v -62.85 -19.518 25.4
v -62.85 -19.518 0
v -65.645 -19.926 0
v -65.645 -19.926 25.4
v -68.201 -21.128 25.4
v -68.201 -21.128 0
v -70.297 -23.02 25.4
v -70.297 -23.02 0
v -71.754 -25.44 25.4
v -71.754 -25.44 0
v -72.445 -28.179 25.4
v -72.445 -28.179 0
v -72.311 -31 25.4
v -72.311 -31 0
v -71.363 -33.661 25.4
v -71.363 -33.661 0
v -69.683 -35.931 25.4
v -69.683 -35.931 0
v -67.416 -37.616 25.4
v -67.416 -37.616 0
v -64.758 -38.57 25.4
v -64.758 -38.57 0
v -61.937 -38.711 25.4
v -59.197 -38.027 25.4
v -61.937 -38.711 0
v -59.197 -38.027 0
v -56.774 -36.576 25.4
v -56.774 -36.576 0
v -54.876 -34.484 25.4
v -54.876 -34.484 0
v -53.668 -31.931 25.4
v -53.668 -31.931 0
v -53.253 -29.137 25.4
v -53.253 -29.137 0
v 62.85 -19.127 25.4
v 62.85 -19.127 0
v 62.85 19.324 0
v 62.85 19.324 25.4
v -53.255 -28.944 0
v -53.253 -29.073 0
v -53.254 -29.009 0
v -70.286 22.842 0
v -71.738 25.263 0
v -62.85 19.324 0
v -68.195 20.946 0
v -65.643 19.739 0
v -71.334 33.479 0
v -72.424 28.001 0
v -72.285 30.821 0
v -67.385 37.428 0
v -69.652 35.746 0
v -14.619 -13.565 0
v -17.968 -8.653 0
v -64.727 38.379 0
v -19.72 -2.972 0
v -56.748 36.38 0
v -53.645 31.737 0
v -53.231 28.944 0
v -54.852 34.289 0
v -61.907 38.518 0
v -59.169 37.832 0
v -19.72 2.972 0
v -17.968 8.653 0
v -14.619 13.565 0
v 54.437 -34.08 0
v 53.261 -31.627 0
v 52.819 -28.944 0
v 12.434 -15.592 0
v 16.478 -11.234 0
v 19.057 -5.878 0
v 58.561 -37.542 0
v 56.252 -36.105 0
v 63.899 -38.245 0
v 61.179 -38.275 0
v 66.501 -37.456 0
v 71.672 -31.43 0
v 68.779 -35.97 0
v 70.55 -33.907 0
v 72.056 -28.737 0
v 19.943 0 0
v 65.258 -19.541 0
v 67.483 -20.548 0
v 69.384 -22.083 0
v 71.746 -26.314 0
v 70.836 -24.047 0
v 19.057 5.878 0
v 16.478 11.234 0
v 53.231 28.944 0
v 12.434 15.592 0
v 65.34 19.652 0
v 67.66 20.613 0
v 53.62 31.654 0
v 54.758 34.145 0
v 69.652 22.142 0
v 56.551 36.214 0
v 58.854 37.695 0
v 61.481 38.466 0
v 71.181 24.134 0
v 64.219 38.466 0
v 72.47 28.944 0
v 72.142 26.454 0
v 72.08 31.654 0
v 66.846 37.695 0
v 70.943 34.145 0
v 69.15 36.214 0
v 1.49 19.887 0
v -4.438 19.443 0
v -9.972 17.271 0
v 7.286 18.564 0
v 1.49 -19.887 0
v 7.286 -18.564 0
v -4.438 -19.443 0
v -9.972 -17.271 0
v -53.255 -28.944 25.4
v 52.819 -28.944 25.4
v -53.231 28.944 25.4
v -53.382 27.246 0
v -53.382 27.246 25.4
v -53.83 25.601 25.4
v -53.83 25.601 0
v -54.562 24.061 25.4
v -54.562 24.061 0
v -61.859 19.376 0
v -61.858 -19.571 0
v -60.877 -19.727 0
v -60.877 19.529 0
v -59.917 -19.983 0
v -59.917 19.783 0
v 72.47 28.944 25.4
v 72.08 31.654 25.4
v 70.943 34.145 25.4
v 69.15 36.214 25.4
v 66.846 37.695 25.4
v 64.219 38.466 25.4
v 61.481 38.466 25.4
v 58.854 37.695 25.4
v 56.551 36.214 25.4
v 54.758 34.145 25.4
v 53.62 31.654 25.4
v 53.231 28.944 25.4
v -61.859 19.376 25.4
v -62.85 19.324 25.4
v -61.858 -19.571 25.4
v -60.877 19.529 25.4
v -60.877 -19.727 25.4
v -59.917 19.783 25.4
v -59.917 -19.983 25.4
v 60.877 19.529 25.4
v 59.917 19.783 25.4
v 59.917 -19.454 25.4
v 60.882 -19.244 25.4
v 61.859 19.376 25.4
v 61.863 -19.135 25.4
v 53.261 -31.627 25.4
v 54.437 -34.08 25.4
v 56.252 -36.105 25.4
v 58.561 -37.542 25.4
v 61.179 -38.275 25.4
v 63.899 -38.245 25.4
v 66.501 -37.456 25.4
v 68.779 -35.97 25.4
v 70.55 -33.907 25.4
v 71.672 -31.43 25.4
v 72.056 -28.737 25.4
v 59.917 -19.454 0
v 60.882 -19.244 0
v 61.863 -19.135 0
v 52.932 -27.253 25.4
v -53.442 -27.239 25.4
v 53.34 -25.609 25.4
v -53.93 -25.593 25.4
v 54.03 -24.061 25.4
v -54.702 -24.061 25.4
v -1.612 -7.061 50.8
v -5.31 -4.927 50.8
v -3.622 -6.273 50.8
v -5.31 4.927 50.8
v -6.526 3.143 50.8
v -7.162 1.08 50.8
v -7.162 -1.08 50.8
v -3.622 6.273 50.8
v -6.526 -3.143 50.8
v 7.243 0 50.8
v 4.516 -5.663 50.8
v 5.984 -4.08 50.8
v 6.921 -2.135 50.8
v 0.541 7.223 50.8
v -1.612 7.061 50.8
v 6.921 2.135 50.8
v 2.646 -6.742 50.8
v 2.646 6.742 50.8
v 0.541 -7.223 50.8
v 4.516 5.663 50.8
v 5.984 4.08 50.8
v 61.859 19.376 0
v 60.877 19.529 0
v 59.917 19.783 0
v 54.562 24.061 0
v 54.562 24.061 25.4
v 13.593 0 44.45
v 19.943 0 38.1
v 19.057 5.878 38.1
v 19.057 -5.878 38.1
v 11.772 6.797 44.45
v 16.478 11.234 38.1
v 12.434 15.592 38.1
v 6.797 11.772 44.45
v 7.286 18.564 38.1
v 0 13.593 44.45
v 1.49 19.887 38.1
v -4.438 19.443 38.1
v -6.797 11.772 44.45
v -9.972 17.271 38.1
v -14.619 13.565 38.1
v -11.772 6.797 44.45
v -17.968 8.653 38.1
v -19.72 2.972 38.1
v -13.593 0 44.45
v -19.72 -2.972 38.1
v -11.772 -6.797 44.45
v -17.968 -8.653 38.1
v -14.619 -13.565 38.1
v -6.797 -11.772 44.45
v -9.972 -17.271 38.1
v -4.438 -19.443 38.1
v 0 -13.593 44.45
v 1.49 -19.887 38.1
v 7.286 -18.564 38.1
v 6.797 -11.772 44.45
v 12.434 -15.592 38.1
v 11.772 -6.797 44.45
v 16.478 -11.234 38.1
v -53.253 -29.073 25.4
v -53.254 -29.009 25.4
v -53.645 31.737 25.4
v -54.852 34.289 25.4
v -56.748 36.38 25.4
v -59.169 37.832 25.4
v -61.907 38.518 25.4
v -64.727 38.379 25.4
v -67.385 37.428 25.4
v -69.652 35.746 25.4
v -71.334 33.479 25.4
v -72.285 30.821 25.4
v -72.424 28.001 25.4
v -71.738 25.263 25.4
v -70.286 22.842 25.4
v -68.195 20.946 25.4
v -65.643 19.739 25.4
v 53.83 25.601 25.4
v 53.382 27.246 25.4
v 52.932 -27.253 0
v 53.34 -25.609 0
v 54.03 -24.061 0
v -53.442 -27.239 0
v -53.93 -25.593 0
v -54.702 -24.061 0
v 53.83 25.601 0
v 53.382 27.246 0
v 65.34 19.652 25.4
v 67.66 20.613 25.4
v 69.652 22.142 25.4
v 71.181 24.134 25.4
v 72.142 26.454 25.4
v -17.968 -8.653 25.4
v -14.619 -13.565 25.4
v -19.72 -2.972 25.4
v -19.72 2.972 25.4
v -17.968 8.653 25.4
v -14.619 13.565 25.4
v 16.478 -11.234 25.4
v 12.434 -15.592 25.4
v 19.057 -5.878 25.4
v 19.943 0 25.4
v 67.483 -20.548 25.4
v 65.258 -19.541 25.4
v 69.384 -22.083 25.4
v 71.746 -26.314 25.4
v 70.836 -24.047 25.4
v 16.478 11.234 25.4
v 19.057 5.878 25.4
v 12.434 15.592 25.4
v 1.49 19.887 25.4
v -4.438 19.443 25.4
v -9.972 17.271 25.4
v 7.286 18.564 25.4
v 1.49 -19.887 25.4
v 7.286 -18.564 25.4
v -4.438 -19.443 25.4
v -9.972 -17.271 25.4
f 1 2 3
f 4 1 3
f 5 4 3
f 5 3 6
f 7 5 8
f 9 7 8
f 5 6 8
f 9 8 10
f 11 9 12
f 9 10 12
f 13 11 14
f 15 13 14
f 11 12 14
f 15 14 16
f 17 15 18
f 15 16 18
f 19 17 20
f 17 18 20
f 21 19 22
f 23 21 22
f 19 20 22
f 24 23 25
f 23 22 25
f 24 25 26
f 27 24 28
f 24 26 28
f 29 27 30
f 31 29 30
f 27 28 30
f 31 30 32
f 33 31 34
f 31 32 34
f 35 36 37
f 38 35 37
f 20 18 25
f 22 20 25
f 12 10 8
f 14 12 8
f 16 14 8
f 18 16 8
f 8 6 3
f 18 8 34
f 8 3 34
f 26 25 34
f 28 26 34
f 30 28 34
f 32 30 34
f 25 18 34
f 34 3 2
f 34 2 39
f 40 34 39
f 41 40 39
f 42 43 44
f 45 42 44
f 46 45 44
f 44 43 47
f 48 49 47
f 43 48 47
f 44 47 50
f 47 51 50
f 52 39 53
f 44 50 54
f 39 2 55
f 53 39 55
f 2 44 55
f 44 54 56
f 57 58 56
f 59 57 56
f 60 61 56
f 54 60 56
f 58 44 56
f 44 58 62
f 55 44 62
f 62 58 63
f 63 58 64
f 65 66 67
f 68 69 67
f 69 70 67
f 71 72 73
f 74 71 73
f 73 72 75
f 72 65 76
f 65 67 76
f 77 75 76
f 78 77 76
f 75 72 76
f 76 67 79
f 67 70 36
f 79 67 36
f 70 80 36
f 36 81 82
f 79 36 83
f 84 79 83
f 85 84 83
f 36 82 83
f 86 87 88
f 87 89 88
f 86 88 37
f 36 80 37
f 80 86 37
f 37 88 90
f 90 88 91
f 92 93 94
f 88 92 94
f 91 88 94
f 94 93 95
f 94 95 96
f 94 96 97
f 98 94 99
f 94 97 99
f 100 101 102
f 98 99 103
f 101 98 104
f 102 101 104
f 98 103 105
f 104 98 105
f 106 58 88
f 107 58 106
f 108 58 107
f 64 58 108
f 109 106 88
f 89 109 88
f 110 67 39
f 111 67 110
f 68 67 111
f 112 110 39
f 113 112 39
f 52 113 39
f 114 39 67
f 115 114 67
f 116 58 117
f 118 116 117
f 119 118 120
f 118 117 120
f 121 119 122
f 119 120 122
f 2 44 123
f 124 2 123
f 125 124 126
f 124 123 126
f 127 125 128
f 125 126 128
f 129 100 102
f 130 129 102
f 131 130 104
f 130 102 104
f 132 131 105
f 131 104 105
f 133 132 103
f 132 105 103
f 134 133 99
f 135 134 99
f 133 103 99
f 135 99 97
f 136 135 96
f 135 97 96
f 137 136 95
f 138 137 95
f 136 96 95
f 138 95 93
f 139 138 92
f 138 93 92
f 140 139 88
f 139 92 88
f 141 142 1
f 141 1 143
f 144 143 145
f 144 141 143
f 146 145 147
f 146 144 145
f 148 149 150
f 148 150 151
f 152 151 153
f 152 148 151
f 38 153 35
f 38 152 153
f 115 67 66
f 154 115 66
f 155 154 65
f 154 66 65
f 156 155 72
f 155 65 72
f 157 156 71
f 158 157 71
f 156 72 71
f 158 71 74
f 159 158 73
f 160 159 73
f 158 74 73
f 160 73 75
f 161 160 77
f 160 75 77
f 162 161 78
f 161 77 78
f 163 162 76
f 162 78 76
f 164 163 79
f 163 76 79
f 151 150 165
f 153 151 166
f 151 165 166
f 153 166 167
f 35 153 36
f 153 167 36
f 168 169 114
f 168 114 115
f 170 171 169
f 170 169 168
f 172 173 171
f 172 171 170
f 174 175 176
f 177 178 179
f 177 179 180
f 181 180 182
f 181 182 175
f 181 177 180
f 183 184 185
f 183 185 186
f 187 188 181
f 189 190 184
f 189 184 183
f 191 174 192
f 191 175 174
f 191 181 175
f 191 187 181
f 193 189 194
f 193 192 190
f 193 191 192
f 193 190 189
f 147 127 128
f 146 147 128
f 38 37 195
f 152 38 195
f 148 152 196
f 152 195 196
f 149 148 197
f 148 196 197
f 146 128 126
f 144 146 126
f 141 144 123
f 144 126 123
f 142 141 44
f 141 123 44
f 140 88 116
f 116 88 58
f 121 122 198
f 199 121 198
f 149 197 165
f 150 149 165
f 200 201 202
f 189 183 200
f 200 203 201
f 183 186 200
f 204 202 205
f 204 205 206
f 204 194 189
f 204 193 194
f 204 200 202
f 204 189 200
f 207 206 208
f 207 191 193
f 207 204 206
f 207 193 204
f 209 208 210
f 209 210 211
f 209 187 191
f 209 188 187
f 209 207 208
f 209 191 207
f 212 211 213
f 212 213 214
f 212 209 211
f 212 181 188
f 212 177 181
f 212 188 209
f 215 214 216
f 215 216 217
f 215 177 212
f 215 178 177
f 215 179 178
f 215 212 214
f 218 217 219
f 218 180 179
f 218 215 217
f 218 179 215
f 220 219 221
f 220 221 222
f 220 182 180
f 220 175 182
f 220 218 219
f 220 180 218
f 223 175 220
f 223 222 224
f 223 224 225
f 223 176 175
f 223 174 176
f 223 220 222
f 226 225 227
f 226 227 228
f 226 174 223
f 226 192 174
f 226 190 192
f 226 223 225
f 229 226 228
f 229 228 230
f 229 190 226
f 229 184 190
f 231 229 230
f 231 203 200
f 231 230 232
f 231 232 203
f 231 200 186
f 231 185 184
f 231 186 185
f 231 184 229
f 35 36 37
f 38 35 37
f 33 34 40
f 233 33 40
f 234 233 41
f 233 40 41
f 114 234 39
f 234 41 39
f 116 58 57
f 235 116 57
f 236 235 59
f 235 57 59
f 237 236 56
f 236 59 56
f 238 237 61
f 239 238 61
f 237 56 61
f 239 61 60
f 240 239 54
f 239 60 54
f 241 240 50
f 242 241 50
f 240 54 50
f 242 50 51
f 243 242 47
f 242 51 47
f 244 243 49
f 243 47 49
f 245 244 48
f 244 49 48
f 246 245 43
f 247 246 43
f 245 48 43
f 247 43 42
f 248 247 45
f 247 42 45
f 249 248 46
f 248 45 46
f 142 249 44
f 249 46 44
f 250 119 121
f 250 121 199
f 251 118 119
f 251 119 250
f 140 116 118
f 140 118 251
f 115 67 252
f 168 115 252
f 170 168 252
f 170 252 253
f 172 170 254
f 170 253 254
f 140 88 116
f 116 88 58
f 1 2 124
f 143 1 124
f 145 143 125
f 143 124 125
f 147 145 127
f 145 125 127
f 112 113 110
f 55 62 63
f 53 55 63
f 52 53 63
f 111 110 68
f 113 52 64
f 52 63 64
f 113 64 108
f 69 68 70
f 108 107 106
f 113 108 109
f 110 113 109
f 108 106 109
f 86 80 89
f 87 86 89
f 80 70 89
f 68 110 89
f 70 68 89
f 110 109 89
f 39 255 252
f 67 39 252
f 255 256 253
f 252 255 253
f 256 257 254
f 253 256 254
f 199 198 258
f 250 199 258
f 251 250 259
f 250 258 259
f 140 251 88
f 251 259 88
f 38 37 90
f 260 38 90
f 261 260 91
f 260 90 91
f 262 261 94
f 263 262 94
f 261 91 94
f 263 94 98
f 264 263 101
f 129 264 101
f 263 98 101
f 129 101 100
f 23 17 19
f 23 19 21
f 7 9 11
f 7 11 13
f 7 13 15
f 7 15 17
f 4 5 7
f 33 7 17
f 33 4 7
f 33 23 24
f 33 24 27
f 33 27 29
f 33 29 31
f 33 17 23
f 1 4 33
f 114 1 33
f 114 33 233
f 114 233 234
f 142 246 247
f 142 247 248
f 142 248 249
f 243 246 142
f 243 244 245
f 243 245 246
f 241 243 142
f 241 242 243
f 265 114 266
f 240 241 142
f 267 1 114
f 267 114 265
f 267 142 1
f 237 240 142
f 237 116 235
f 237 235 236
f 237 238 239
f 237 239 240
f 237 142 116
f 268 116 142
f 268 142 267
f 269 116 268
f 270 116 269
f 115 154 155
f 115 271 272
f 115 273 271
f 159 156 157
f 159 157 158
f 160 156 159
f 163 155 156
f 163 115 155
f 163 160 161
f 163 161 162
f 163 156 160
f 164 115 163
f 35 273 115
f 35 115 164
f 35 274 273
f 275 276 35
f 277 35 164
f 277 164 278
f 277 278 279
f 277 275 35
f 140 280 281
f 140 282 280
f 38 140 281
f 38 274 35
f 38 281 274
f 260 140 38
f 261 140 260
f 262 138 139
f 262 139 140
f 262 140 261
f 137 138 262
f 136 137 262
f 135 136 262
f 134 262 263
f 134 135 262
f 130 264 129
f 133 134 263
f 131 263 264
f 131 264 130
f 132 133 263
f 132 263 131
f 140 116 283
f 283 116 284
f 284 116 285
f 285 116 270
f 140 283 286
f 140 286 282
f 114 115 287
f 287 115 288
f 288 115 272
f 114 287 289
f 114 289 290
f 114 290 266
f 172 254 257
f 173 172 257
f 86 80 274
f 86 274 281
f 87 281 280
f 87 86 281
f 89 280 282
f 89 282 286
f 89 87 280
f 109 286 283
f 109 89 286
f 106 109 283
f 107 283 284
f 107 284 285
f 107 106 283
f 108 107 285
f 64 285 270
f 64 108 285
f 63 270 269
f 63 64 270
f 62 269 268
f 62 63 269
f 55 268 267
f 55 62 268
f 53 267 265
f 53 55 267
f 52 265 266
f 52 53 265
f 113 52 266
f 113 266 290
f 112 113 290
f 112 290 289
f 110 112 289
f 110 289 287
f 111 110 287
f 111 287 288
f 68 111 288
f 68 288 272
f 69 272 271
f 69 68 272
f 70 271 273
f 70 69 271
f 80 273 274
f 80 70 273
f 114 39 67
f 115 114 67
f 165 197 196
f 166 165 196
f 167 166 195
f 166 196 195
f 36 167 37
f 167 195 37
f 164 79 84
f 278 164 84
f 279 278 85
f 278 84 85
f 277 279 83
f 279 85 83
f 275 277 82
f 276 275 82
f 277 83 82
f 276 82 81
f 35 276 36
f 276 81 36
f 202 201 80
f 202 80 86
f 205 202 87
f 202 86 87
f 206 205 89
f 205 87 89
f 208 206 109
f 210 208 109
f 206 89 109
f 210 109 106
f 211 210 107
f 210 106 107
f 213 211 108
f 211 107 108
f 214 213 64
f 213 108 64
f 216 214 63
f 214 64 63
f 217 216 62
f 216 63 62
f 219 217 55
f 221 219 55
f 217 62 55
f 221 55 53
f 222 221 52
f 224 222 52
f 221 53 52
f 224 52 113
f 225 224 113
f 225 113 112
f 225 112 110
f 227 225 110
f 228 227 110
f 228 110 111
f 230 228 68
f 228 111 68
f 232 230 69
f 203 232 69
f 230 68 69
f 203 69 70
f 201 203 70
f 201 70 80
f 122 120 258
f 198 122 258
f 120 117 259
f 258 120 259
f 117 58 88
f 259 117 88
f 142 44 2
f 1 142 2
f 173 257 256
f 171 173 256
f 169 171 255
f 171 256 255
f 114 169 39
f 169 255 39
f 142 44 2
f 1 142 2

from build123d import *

# Parameters (mm, degrees)
F1_DEPTH = 25.4
F0_R     = 19.9430471138
F2_DEPTH = 50.8
F3_SIZE  = 12.7
F4_DEPTH = 25.4


with BuildPart() as f1:
    # F0 (on Top) → F1 (new body)
    with BuildSketch(Plane.XY):
        with BuildLine():
            ThreePointArc((-59.9172078073, 19.7825102522), (-61.3659473506, 19.4396687918), (-62.8502368927, 19.3244685906))
            Line((-62.8502368927, 19.3244685906), (-62.8502368927, -19.5175472842))
            ThreePointArc((-62.8502368927, -19.5175472842), (-61.3656586606, -19.6363337398), (-59.9172078073, -19.9828490707))
            Line((-59.9172078073, -19.9828490707), (-59.9172078073, 19.7825102522))
        make_face()
    extrude(amount=F1_DEPTH)


with BuildPart() as f1b:
    # F0 (on Top) → F1, piece 2 (new body)
    with BuildSketch(Plane.XY):
        with BuildLine():
            ThreePointArc((52.8192537854, -28.9441850036), (53.0998431919, -26.4220256358), (54.0302113527, -24.0610018373))
            Line((54.0302113527, -24.0610018373), (-54.7015625949, -24.0610018373))
            ThreePointArc((-54.7015625949, -24.0610018373), (-53.6493149559, -26.4051326723), (-53.25512246, -28.9441850036))
            Line((-53.25512246, -28.9441850036), (52.8192537854, -28.9441850036))
        make_face()
    extrude(amount=F1_DEPTH)


with BuildPart() as f1c:
    # F0 (on Top) → F1, piece 3 (new body)
    with BuildSketch(Plane.XY):
        with BuildLine():
            Line((62.8502368927, -19.1266149839), (62.8502368927, 19.3244685906))
            ThreePointArc((62.8502368927, 19.3244685906), (61.3659473506, 19.4396687918), (59.9172078073, 19.7825102522))
            Line((59.9172078073, 19.7825102522), (59.9172078073, -19.4535374533))
            ThreePointArc((59.9172078073, -19.4535374533), (61.3711108257, -19.1769302248), (62.8502368927, -19.1266149839))
        make_face()
    extrude(amount=F1_DEPTH)


with BuildPart() as f1d:
    # F0 (on Top) → F1, piece 4 (new body)
    with BuildSketch(Plane.XY):
        with BuildLine():
            ThreePointArc((54.5620847446, 24.0610018373), (53.5693797901, 26.4134469083), (53.2305204797, 28.9441850036))
            Line((53.2305204797, 28.9441850036), (-53.2305204797, 28.9441850036))
            ThreePointArc((-53.2305204797, 28.9441850036), (-53.5693797901, 26.4134469083), (-54.5620847446, 24.0610018373))
            Line((-54.5620847446, 24.0610018373), (54.5620847446, 24.0610018373))
        make_face()
    extrude(amount=F1_DEPTH)


with BuildPart() as f2:
    # F0 (on Top) → F2 (new body)
    with BuildSketch(Plane.XY):
        Circle(F0_R)
    extrude(amount=F2_DEPTH)

    # F3
    f3_edges = [f2.edges().sort_by_distance(p)[0] for p in [
        (-19.943047, 0, 50.8),
    ]]
    chamfer(f3_edges, length=F3_SIZE)


with BuildPart() as f4:
    # F0 (on Top) → F4 (new body)
    with BuildSketch(Plane.XY):
        with BuildLine():
            ThreePointArc((72.056464709, -28.7374407053), (69.3835672409, -22.0830699301), (62.8502368927, -19.1266149839))
            ThreePointArc((62.8502368927, -19.1266149839), (61.3711108257, -19.1769302248), (59.9172078073, -19.4535374533))
            ThreePointArc((59.9172078073, -19.4535374533), (56.507838276, -21.1620219155), (54.0302113527, -24.0610018373))
            ThreePointArc((54.0302113527, -24.0610018373), (53.0998431919, -26.4220256358), (52.8192537854, -28.9441850036))
            ThreePointArc((52.8192537854, -28.9441850036), (62.5401264148, -38.3566016267), (72.056464709, -28.7374407053))
        make_face()
        with BuildLine():
            ThreePointArc((54.5620847446, 24.0610018373), (53.5693797901, 26.4134469083), (53.2305204797, 28.9441850036))
            Line((53.2305204797, 28.9441850036), (-53.2305204797, 28.9441850036))
            ThreePointArc((-53.2305204797, 28.9441850036), (-53.5693797901, 26.4134469083), (-54.5620847446, 24.0610018373))
            Line((-54.5620847446, 24.0610018373), (54.5620847446, 24.0610018373))
        make_face()
        with BuildLine():
            ThreePointArc((72.4699533057, 28.9441850036), (62.8502368927, 38.5639014166), (53.2305204797, 28.9441850036))
            ThreePointArc((53.2305204797, 28.9441850036), (53.5693797901, 26.4134469083), (54.5620847446, 24.0610018373))
            ThreePointArc((54.5620847446, 24.0610018373), (56.8456470125, 21.4286115567), (59.9172078073, 19.7825102522))
            ThreePointArc((59.9172078073, 19.7825102522), (61.3659473506, 19.4396687918), (62.8502368927, 19.3244685906))
            ThreePointArc((62.8502368927, 19.3244685906), (69.6524036014, 22.1420182949), (72.4699533057, 28.9441850036))
        make_face()
        with BuildLine():
            ThreePointArc((-54.5620847446, 24.0610018373), (-53.5693797901, 26.4134469083), (-53.2305204797, 28.9441850036))
            ThreePointArc((-53.2305204797, 28.9441850036), (-69.6524036014, 35.7463517124), (-62.8502368927, 19.3244685906))
            ThreePointArc((-62.8502368927, 19.3244685906), (-61.3659473506, 19.4396687918), (-59.9172078073, 19.7825102522))
            Line((-59.9172078073, 19.7825102522), (-59.9172078073, -19.9828490707))
            ThreePointArc((-59.9172078073, -19.9828490707), (-56.947486235, -21.5590843792), (-54.7015625949, -24.0610018373))
            Line((-54.7015625949, -24.0610018373), (54.0302113527, -24.0610018373))
            ThreePointArc((54.0302113527, -24.0610018373), (56.507838276, -21.1620219155), (59.9172078073, -19.4535374533))
            Line((59.9172078073, -19.4535374533), (59.9172078073, 19.7825102522))
            ThreePointArc((59.9172078073, 19.7825102522), (56.8456470125, 21.4286115567), (54.5620847446, 24.0610018373))
            Line((54.5620847446, 24.0610018373), (-54.5620847446, 24.0610018373))
        make_face()
        Circle(F0_R, mode=Mode.SUBTRACT)
        with BuildLine():
            ThreePointArc((-59.9172078073, 19.7825102522), (-61.3659473506, 19.4396687918), (-62.8502368927, 19.3244685906))
            Line((-62.8502368927, 19.3244685906), (-62.8502368927, -19.5175472842))
            ThreePointArc((-62.8502368927, -19.5175472842), (-61.3656586606, -19.6363337398), (-59.9172078073, -19.9828490707))
            Line((-59.9172078073, -19.9828490707), (-59.9172078073, 19.7825102522))
        make_face()
        with BuildLine():
            Line((62.8502368927, -19.1266149839), (62.8502368927, 19.3244685906))
            ThreePointArc((62.8502368927, 19.3244685906), (61.3659473506, 19.4396687918), (59.9172078073, 19.7825102522))
            Line((59.9172078073, 19.7825102522), (59.9172078073, -19.4535374533))
            ThreePointArc((59.9172078073, -19.4535374533), (61.3711108257, -19.1769302248), (62.8502368927, -19.1266149839))
        make_face()
        with BuildLine():
            ThreePointArc((-59.9172078073, -19.9828490707), (-61.3656586606, -19.6363337398), (-62.8502368927, -19.5175472842))
            ThreePointArc((-62.8502368927, -19.5175472842), (-69.6830767228, -35.9313858112), (-53.2531851459, -29.1372369975))
            ThreePointArc((-53.2531851459, -29.1372369975), (-53.2536694866, -29.0407061404), (-53.25512246, -28.9441850036))
            ThreePointArc((-53.25512246, -28.9441850036), (-53.6493149559, -26.4051326723), (-54.7015625949, -24.0610018373))
            ThreePointArc((-54.7015625949, -24.0610018373), (-56.947486235, -21.5590843792), (-59.9172078073, -19.9828490707))
        make_face()
        with BuildLine():
            ThreePointArc((52.8192537854, -28.9441850036), (53.0998431919, -26.4220256358), (54.0302113527, -24.0610018373))
            Line((54.0302113527, -24.0610018373), (-54.7015625949, -24.0610018373))
            ThreePointArc((-54.7015625949, -24.0610018373), (-53.6493149559, -26.4051326723), (-53.25512246, -28.9441850036))
            Line((-53.25512246, -28.9441850036), (52.8192537854, -28.9441850036))
        make_face()
    extrude(amount=F4_DEPTH)


solid = Compound([f1.part, f1b.part, f1c.part, f1d.part, f2.part, f4.part])
